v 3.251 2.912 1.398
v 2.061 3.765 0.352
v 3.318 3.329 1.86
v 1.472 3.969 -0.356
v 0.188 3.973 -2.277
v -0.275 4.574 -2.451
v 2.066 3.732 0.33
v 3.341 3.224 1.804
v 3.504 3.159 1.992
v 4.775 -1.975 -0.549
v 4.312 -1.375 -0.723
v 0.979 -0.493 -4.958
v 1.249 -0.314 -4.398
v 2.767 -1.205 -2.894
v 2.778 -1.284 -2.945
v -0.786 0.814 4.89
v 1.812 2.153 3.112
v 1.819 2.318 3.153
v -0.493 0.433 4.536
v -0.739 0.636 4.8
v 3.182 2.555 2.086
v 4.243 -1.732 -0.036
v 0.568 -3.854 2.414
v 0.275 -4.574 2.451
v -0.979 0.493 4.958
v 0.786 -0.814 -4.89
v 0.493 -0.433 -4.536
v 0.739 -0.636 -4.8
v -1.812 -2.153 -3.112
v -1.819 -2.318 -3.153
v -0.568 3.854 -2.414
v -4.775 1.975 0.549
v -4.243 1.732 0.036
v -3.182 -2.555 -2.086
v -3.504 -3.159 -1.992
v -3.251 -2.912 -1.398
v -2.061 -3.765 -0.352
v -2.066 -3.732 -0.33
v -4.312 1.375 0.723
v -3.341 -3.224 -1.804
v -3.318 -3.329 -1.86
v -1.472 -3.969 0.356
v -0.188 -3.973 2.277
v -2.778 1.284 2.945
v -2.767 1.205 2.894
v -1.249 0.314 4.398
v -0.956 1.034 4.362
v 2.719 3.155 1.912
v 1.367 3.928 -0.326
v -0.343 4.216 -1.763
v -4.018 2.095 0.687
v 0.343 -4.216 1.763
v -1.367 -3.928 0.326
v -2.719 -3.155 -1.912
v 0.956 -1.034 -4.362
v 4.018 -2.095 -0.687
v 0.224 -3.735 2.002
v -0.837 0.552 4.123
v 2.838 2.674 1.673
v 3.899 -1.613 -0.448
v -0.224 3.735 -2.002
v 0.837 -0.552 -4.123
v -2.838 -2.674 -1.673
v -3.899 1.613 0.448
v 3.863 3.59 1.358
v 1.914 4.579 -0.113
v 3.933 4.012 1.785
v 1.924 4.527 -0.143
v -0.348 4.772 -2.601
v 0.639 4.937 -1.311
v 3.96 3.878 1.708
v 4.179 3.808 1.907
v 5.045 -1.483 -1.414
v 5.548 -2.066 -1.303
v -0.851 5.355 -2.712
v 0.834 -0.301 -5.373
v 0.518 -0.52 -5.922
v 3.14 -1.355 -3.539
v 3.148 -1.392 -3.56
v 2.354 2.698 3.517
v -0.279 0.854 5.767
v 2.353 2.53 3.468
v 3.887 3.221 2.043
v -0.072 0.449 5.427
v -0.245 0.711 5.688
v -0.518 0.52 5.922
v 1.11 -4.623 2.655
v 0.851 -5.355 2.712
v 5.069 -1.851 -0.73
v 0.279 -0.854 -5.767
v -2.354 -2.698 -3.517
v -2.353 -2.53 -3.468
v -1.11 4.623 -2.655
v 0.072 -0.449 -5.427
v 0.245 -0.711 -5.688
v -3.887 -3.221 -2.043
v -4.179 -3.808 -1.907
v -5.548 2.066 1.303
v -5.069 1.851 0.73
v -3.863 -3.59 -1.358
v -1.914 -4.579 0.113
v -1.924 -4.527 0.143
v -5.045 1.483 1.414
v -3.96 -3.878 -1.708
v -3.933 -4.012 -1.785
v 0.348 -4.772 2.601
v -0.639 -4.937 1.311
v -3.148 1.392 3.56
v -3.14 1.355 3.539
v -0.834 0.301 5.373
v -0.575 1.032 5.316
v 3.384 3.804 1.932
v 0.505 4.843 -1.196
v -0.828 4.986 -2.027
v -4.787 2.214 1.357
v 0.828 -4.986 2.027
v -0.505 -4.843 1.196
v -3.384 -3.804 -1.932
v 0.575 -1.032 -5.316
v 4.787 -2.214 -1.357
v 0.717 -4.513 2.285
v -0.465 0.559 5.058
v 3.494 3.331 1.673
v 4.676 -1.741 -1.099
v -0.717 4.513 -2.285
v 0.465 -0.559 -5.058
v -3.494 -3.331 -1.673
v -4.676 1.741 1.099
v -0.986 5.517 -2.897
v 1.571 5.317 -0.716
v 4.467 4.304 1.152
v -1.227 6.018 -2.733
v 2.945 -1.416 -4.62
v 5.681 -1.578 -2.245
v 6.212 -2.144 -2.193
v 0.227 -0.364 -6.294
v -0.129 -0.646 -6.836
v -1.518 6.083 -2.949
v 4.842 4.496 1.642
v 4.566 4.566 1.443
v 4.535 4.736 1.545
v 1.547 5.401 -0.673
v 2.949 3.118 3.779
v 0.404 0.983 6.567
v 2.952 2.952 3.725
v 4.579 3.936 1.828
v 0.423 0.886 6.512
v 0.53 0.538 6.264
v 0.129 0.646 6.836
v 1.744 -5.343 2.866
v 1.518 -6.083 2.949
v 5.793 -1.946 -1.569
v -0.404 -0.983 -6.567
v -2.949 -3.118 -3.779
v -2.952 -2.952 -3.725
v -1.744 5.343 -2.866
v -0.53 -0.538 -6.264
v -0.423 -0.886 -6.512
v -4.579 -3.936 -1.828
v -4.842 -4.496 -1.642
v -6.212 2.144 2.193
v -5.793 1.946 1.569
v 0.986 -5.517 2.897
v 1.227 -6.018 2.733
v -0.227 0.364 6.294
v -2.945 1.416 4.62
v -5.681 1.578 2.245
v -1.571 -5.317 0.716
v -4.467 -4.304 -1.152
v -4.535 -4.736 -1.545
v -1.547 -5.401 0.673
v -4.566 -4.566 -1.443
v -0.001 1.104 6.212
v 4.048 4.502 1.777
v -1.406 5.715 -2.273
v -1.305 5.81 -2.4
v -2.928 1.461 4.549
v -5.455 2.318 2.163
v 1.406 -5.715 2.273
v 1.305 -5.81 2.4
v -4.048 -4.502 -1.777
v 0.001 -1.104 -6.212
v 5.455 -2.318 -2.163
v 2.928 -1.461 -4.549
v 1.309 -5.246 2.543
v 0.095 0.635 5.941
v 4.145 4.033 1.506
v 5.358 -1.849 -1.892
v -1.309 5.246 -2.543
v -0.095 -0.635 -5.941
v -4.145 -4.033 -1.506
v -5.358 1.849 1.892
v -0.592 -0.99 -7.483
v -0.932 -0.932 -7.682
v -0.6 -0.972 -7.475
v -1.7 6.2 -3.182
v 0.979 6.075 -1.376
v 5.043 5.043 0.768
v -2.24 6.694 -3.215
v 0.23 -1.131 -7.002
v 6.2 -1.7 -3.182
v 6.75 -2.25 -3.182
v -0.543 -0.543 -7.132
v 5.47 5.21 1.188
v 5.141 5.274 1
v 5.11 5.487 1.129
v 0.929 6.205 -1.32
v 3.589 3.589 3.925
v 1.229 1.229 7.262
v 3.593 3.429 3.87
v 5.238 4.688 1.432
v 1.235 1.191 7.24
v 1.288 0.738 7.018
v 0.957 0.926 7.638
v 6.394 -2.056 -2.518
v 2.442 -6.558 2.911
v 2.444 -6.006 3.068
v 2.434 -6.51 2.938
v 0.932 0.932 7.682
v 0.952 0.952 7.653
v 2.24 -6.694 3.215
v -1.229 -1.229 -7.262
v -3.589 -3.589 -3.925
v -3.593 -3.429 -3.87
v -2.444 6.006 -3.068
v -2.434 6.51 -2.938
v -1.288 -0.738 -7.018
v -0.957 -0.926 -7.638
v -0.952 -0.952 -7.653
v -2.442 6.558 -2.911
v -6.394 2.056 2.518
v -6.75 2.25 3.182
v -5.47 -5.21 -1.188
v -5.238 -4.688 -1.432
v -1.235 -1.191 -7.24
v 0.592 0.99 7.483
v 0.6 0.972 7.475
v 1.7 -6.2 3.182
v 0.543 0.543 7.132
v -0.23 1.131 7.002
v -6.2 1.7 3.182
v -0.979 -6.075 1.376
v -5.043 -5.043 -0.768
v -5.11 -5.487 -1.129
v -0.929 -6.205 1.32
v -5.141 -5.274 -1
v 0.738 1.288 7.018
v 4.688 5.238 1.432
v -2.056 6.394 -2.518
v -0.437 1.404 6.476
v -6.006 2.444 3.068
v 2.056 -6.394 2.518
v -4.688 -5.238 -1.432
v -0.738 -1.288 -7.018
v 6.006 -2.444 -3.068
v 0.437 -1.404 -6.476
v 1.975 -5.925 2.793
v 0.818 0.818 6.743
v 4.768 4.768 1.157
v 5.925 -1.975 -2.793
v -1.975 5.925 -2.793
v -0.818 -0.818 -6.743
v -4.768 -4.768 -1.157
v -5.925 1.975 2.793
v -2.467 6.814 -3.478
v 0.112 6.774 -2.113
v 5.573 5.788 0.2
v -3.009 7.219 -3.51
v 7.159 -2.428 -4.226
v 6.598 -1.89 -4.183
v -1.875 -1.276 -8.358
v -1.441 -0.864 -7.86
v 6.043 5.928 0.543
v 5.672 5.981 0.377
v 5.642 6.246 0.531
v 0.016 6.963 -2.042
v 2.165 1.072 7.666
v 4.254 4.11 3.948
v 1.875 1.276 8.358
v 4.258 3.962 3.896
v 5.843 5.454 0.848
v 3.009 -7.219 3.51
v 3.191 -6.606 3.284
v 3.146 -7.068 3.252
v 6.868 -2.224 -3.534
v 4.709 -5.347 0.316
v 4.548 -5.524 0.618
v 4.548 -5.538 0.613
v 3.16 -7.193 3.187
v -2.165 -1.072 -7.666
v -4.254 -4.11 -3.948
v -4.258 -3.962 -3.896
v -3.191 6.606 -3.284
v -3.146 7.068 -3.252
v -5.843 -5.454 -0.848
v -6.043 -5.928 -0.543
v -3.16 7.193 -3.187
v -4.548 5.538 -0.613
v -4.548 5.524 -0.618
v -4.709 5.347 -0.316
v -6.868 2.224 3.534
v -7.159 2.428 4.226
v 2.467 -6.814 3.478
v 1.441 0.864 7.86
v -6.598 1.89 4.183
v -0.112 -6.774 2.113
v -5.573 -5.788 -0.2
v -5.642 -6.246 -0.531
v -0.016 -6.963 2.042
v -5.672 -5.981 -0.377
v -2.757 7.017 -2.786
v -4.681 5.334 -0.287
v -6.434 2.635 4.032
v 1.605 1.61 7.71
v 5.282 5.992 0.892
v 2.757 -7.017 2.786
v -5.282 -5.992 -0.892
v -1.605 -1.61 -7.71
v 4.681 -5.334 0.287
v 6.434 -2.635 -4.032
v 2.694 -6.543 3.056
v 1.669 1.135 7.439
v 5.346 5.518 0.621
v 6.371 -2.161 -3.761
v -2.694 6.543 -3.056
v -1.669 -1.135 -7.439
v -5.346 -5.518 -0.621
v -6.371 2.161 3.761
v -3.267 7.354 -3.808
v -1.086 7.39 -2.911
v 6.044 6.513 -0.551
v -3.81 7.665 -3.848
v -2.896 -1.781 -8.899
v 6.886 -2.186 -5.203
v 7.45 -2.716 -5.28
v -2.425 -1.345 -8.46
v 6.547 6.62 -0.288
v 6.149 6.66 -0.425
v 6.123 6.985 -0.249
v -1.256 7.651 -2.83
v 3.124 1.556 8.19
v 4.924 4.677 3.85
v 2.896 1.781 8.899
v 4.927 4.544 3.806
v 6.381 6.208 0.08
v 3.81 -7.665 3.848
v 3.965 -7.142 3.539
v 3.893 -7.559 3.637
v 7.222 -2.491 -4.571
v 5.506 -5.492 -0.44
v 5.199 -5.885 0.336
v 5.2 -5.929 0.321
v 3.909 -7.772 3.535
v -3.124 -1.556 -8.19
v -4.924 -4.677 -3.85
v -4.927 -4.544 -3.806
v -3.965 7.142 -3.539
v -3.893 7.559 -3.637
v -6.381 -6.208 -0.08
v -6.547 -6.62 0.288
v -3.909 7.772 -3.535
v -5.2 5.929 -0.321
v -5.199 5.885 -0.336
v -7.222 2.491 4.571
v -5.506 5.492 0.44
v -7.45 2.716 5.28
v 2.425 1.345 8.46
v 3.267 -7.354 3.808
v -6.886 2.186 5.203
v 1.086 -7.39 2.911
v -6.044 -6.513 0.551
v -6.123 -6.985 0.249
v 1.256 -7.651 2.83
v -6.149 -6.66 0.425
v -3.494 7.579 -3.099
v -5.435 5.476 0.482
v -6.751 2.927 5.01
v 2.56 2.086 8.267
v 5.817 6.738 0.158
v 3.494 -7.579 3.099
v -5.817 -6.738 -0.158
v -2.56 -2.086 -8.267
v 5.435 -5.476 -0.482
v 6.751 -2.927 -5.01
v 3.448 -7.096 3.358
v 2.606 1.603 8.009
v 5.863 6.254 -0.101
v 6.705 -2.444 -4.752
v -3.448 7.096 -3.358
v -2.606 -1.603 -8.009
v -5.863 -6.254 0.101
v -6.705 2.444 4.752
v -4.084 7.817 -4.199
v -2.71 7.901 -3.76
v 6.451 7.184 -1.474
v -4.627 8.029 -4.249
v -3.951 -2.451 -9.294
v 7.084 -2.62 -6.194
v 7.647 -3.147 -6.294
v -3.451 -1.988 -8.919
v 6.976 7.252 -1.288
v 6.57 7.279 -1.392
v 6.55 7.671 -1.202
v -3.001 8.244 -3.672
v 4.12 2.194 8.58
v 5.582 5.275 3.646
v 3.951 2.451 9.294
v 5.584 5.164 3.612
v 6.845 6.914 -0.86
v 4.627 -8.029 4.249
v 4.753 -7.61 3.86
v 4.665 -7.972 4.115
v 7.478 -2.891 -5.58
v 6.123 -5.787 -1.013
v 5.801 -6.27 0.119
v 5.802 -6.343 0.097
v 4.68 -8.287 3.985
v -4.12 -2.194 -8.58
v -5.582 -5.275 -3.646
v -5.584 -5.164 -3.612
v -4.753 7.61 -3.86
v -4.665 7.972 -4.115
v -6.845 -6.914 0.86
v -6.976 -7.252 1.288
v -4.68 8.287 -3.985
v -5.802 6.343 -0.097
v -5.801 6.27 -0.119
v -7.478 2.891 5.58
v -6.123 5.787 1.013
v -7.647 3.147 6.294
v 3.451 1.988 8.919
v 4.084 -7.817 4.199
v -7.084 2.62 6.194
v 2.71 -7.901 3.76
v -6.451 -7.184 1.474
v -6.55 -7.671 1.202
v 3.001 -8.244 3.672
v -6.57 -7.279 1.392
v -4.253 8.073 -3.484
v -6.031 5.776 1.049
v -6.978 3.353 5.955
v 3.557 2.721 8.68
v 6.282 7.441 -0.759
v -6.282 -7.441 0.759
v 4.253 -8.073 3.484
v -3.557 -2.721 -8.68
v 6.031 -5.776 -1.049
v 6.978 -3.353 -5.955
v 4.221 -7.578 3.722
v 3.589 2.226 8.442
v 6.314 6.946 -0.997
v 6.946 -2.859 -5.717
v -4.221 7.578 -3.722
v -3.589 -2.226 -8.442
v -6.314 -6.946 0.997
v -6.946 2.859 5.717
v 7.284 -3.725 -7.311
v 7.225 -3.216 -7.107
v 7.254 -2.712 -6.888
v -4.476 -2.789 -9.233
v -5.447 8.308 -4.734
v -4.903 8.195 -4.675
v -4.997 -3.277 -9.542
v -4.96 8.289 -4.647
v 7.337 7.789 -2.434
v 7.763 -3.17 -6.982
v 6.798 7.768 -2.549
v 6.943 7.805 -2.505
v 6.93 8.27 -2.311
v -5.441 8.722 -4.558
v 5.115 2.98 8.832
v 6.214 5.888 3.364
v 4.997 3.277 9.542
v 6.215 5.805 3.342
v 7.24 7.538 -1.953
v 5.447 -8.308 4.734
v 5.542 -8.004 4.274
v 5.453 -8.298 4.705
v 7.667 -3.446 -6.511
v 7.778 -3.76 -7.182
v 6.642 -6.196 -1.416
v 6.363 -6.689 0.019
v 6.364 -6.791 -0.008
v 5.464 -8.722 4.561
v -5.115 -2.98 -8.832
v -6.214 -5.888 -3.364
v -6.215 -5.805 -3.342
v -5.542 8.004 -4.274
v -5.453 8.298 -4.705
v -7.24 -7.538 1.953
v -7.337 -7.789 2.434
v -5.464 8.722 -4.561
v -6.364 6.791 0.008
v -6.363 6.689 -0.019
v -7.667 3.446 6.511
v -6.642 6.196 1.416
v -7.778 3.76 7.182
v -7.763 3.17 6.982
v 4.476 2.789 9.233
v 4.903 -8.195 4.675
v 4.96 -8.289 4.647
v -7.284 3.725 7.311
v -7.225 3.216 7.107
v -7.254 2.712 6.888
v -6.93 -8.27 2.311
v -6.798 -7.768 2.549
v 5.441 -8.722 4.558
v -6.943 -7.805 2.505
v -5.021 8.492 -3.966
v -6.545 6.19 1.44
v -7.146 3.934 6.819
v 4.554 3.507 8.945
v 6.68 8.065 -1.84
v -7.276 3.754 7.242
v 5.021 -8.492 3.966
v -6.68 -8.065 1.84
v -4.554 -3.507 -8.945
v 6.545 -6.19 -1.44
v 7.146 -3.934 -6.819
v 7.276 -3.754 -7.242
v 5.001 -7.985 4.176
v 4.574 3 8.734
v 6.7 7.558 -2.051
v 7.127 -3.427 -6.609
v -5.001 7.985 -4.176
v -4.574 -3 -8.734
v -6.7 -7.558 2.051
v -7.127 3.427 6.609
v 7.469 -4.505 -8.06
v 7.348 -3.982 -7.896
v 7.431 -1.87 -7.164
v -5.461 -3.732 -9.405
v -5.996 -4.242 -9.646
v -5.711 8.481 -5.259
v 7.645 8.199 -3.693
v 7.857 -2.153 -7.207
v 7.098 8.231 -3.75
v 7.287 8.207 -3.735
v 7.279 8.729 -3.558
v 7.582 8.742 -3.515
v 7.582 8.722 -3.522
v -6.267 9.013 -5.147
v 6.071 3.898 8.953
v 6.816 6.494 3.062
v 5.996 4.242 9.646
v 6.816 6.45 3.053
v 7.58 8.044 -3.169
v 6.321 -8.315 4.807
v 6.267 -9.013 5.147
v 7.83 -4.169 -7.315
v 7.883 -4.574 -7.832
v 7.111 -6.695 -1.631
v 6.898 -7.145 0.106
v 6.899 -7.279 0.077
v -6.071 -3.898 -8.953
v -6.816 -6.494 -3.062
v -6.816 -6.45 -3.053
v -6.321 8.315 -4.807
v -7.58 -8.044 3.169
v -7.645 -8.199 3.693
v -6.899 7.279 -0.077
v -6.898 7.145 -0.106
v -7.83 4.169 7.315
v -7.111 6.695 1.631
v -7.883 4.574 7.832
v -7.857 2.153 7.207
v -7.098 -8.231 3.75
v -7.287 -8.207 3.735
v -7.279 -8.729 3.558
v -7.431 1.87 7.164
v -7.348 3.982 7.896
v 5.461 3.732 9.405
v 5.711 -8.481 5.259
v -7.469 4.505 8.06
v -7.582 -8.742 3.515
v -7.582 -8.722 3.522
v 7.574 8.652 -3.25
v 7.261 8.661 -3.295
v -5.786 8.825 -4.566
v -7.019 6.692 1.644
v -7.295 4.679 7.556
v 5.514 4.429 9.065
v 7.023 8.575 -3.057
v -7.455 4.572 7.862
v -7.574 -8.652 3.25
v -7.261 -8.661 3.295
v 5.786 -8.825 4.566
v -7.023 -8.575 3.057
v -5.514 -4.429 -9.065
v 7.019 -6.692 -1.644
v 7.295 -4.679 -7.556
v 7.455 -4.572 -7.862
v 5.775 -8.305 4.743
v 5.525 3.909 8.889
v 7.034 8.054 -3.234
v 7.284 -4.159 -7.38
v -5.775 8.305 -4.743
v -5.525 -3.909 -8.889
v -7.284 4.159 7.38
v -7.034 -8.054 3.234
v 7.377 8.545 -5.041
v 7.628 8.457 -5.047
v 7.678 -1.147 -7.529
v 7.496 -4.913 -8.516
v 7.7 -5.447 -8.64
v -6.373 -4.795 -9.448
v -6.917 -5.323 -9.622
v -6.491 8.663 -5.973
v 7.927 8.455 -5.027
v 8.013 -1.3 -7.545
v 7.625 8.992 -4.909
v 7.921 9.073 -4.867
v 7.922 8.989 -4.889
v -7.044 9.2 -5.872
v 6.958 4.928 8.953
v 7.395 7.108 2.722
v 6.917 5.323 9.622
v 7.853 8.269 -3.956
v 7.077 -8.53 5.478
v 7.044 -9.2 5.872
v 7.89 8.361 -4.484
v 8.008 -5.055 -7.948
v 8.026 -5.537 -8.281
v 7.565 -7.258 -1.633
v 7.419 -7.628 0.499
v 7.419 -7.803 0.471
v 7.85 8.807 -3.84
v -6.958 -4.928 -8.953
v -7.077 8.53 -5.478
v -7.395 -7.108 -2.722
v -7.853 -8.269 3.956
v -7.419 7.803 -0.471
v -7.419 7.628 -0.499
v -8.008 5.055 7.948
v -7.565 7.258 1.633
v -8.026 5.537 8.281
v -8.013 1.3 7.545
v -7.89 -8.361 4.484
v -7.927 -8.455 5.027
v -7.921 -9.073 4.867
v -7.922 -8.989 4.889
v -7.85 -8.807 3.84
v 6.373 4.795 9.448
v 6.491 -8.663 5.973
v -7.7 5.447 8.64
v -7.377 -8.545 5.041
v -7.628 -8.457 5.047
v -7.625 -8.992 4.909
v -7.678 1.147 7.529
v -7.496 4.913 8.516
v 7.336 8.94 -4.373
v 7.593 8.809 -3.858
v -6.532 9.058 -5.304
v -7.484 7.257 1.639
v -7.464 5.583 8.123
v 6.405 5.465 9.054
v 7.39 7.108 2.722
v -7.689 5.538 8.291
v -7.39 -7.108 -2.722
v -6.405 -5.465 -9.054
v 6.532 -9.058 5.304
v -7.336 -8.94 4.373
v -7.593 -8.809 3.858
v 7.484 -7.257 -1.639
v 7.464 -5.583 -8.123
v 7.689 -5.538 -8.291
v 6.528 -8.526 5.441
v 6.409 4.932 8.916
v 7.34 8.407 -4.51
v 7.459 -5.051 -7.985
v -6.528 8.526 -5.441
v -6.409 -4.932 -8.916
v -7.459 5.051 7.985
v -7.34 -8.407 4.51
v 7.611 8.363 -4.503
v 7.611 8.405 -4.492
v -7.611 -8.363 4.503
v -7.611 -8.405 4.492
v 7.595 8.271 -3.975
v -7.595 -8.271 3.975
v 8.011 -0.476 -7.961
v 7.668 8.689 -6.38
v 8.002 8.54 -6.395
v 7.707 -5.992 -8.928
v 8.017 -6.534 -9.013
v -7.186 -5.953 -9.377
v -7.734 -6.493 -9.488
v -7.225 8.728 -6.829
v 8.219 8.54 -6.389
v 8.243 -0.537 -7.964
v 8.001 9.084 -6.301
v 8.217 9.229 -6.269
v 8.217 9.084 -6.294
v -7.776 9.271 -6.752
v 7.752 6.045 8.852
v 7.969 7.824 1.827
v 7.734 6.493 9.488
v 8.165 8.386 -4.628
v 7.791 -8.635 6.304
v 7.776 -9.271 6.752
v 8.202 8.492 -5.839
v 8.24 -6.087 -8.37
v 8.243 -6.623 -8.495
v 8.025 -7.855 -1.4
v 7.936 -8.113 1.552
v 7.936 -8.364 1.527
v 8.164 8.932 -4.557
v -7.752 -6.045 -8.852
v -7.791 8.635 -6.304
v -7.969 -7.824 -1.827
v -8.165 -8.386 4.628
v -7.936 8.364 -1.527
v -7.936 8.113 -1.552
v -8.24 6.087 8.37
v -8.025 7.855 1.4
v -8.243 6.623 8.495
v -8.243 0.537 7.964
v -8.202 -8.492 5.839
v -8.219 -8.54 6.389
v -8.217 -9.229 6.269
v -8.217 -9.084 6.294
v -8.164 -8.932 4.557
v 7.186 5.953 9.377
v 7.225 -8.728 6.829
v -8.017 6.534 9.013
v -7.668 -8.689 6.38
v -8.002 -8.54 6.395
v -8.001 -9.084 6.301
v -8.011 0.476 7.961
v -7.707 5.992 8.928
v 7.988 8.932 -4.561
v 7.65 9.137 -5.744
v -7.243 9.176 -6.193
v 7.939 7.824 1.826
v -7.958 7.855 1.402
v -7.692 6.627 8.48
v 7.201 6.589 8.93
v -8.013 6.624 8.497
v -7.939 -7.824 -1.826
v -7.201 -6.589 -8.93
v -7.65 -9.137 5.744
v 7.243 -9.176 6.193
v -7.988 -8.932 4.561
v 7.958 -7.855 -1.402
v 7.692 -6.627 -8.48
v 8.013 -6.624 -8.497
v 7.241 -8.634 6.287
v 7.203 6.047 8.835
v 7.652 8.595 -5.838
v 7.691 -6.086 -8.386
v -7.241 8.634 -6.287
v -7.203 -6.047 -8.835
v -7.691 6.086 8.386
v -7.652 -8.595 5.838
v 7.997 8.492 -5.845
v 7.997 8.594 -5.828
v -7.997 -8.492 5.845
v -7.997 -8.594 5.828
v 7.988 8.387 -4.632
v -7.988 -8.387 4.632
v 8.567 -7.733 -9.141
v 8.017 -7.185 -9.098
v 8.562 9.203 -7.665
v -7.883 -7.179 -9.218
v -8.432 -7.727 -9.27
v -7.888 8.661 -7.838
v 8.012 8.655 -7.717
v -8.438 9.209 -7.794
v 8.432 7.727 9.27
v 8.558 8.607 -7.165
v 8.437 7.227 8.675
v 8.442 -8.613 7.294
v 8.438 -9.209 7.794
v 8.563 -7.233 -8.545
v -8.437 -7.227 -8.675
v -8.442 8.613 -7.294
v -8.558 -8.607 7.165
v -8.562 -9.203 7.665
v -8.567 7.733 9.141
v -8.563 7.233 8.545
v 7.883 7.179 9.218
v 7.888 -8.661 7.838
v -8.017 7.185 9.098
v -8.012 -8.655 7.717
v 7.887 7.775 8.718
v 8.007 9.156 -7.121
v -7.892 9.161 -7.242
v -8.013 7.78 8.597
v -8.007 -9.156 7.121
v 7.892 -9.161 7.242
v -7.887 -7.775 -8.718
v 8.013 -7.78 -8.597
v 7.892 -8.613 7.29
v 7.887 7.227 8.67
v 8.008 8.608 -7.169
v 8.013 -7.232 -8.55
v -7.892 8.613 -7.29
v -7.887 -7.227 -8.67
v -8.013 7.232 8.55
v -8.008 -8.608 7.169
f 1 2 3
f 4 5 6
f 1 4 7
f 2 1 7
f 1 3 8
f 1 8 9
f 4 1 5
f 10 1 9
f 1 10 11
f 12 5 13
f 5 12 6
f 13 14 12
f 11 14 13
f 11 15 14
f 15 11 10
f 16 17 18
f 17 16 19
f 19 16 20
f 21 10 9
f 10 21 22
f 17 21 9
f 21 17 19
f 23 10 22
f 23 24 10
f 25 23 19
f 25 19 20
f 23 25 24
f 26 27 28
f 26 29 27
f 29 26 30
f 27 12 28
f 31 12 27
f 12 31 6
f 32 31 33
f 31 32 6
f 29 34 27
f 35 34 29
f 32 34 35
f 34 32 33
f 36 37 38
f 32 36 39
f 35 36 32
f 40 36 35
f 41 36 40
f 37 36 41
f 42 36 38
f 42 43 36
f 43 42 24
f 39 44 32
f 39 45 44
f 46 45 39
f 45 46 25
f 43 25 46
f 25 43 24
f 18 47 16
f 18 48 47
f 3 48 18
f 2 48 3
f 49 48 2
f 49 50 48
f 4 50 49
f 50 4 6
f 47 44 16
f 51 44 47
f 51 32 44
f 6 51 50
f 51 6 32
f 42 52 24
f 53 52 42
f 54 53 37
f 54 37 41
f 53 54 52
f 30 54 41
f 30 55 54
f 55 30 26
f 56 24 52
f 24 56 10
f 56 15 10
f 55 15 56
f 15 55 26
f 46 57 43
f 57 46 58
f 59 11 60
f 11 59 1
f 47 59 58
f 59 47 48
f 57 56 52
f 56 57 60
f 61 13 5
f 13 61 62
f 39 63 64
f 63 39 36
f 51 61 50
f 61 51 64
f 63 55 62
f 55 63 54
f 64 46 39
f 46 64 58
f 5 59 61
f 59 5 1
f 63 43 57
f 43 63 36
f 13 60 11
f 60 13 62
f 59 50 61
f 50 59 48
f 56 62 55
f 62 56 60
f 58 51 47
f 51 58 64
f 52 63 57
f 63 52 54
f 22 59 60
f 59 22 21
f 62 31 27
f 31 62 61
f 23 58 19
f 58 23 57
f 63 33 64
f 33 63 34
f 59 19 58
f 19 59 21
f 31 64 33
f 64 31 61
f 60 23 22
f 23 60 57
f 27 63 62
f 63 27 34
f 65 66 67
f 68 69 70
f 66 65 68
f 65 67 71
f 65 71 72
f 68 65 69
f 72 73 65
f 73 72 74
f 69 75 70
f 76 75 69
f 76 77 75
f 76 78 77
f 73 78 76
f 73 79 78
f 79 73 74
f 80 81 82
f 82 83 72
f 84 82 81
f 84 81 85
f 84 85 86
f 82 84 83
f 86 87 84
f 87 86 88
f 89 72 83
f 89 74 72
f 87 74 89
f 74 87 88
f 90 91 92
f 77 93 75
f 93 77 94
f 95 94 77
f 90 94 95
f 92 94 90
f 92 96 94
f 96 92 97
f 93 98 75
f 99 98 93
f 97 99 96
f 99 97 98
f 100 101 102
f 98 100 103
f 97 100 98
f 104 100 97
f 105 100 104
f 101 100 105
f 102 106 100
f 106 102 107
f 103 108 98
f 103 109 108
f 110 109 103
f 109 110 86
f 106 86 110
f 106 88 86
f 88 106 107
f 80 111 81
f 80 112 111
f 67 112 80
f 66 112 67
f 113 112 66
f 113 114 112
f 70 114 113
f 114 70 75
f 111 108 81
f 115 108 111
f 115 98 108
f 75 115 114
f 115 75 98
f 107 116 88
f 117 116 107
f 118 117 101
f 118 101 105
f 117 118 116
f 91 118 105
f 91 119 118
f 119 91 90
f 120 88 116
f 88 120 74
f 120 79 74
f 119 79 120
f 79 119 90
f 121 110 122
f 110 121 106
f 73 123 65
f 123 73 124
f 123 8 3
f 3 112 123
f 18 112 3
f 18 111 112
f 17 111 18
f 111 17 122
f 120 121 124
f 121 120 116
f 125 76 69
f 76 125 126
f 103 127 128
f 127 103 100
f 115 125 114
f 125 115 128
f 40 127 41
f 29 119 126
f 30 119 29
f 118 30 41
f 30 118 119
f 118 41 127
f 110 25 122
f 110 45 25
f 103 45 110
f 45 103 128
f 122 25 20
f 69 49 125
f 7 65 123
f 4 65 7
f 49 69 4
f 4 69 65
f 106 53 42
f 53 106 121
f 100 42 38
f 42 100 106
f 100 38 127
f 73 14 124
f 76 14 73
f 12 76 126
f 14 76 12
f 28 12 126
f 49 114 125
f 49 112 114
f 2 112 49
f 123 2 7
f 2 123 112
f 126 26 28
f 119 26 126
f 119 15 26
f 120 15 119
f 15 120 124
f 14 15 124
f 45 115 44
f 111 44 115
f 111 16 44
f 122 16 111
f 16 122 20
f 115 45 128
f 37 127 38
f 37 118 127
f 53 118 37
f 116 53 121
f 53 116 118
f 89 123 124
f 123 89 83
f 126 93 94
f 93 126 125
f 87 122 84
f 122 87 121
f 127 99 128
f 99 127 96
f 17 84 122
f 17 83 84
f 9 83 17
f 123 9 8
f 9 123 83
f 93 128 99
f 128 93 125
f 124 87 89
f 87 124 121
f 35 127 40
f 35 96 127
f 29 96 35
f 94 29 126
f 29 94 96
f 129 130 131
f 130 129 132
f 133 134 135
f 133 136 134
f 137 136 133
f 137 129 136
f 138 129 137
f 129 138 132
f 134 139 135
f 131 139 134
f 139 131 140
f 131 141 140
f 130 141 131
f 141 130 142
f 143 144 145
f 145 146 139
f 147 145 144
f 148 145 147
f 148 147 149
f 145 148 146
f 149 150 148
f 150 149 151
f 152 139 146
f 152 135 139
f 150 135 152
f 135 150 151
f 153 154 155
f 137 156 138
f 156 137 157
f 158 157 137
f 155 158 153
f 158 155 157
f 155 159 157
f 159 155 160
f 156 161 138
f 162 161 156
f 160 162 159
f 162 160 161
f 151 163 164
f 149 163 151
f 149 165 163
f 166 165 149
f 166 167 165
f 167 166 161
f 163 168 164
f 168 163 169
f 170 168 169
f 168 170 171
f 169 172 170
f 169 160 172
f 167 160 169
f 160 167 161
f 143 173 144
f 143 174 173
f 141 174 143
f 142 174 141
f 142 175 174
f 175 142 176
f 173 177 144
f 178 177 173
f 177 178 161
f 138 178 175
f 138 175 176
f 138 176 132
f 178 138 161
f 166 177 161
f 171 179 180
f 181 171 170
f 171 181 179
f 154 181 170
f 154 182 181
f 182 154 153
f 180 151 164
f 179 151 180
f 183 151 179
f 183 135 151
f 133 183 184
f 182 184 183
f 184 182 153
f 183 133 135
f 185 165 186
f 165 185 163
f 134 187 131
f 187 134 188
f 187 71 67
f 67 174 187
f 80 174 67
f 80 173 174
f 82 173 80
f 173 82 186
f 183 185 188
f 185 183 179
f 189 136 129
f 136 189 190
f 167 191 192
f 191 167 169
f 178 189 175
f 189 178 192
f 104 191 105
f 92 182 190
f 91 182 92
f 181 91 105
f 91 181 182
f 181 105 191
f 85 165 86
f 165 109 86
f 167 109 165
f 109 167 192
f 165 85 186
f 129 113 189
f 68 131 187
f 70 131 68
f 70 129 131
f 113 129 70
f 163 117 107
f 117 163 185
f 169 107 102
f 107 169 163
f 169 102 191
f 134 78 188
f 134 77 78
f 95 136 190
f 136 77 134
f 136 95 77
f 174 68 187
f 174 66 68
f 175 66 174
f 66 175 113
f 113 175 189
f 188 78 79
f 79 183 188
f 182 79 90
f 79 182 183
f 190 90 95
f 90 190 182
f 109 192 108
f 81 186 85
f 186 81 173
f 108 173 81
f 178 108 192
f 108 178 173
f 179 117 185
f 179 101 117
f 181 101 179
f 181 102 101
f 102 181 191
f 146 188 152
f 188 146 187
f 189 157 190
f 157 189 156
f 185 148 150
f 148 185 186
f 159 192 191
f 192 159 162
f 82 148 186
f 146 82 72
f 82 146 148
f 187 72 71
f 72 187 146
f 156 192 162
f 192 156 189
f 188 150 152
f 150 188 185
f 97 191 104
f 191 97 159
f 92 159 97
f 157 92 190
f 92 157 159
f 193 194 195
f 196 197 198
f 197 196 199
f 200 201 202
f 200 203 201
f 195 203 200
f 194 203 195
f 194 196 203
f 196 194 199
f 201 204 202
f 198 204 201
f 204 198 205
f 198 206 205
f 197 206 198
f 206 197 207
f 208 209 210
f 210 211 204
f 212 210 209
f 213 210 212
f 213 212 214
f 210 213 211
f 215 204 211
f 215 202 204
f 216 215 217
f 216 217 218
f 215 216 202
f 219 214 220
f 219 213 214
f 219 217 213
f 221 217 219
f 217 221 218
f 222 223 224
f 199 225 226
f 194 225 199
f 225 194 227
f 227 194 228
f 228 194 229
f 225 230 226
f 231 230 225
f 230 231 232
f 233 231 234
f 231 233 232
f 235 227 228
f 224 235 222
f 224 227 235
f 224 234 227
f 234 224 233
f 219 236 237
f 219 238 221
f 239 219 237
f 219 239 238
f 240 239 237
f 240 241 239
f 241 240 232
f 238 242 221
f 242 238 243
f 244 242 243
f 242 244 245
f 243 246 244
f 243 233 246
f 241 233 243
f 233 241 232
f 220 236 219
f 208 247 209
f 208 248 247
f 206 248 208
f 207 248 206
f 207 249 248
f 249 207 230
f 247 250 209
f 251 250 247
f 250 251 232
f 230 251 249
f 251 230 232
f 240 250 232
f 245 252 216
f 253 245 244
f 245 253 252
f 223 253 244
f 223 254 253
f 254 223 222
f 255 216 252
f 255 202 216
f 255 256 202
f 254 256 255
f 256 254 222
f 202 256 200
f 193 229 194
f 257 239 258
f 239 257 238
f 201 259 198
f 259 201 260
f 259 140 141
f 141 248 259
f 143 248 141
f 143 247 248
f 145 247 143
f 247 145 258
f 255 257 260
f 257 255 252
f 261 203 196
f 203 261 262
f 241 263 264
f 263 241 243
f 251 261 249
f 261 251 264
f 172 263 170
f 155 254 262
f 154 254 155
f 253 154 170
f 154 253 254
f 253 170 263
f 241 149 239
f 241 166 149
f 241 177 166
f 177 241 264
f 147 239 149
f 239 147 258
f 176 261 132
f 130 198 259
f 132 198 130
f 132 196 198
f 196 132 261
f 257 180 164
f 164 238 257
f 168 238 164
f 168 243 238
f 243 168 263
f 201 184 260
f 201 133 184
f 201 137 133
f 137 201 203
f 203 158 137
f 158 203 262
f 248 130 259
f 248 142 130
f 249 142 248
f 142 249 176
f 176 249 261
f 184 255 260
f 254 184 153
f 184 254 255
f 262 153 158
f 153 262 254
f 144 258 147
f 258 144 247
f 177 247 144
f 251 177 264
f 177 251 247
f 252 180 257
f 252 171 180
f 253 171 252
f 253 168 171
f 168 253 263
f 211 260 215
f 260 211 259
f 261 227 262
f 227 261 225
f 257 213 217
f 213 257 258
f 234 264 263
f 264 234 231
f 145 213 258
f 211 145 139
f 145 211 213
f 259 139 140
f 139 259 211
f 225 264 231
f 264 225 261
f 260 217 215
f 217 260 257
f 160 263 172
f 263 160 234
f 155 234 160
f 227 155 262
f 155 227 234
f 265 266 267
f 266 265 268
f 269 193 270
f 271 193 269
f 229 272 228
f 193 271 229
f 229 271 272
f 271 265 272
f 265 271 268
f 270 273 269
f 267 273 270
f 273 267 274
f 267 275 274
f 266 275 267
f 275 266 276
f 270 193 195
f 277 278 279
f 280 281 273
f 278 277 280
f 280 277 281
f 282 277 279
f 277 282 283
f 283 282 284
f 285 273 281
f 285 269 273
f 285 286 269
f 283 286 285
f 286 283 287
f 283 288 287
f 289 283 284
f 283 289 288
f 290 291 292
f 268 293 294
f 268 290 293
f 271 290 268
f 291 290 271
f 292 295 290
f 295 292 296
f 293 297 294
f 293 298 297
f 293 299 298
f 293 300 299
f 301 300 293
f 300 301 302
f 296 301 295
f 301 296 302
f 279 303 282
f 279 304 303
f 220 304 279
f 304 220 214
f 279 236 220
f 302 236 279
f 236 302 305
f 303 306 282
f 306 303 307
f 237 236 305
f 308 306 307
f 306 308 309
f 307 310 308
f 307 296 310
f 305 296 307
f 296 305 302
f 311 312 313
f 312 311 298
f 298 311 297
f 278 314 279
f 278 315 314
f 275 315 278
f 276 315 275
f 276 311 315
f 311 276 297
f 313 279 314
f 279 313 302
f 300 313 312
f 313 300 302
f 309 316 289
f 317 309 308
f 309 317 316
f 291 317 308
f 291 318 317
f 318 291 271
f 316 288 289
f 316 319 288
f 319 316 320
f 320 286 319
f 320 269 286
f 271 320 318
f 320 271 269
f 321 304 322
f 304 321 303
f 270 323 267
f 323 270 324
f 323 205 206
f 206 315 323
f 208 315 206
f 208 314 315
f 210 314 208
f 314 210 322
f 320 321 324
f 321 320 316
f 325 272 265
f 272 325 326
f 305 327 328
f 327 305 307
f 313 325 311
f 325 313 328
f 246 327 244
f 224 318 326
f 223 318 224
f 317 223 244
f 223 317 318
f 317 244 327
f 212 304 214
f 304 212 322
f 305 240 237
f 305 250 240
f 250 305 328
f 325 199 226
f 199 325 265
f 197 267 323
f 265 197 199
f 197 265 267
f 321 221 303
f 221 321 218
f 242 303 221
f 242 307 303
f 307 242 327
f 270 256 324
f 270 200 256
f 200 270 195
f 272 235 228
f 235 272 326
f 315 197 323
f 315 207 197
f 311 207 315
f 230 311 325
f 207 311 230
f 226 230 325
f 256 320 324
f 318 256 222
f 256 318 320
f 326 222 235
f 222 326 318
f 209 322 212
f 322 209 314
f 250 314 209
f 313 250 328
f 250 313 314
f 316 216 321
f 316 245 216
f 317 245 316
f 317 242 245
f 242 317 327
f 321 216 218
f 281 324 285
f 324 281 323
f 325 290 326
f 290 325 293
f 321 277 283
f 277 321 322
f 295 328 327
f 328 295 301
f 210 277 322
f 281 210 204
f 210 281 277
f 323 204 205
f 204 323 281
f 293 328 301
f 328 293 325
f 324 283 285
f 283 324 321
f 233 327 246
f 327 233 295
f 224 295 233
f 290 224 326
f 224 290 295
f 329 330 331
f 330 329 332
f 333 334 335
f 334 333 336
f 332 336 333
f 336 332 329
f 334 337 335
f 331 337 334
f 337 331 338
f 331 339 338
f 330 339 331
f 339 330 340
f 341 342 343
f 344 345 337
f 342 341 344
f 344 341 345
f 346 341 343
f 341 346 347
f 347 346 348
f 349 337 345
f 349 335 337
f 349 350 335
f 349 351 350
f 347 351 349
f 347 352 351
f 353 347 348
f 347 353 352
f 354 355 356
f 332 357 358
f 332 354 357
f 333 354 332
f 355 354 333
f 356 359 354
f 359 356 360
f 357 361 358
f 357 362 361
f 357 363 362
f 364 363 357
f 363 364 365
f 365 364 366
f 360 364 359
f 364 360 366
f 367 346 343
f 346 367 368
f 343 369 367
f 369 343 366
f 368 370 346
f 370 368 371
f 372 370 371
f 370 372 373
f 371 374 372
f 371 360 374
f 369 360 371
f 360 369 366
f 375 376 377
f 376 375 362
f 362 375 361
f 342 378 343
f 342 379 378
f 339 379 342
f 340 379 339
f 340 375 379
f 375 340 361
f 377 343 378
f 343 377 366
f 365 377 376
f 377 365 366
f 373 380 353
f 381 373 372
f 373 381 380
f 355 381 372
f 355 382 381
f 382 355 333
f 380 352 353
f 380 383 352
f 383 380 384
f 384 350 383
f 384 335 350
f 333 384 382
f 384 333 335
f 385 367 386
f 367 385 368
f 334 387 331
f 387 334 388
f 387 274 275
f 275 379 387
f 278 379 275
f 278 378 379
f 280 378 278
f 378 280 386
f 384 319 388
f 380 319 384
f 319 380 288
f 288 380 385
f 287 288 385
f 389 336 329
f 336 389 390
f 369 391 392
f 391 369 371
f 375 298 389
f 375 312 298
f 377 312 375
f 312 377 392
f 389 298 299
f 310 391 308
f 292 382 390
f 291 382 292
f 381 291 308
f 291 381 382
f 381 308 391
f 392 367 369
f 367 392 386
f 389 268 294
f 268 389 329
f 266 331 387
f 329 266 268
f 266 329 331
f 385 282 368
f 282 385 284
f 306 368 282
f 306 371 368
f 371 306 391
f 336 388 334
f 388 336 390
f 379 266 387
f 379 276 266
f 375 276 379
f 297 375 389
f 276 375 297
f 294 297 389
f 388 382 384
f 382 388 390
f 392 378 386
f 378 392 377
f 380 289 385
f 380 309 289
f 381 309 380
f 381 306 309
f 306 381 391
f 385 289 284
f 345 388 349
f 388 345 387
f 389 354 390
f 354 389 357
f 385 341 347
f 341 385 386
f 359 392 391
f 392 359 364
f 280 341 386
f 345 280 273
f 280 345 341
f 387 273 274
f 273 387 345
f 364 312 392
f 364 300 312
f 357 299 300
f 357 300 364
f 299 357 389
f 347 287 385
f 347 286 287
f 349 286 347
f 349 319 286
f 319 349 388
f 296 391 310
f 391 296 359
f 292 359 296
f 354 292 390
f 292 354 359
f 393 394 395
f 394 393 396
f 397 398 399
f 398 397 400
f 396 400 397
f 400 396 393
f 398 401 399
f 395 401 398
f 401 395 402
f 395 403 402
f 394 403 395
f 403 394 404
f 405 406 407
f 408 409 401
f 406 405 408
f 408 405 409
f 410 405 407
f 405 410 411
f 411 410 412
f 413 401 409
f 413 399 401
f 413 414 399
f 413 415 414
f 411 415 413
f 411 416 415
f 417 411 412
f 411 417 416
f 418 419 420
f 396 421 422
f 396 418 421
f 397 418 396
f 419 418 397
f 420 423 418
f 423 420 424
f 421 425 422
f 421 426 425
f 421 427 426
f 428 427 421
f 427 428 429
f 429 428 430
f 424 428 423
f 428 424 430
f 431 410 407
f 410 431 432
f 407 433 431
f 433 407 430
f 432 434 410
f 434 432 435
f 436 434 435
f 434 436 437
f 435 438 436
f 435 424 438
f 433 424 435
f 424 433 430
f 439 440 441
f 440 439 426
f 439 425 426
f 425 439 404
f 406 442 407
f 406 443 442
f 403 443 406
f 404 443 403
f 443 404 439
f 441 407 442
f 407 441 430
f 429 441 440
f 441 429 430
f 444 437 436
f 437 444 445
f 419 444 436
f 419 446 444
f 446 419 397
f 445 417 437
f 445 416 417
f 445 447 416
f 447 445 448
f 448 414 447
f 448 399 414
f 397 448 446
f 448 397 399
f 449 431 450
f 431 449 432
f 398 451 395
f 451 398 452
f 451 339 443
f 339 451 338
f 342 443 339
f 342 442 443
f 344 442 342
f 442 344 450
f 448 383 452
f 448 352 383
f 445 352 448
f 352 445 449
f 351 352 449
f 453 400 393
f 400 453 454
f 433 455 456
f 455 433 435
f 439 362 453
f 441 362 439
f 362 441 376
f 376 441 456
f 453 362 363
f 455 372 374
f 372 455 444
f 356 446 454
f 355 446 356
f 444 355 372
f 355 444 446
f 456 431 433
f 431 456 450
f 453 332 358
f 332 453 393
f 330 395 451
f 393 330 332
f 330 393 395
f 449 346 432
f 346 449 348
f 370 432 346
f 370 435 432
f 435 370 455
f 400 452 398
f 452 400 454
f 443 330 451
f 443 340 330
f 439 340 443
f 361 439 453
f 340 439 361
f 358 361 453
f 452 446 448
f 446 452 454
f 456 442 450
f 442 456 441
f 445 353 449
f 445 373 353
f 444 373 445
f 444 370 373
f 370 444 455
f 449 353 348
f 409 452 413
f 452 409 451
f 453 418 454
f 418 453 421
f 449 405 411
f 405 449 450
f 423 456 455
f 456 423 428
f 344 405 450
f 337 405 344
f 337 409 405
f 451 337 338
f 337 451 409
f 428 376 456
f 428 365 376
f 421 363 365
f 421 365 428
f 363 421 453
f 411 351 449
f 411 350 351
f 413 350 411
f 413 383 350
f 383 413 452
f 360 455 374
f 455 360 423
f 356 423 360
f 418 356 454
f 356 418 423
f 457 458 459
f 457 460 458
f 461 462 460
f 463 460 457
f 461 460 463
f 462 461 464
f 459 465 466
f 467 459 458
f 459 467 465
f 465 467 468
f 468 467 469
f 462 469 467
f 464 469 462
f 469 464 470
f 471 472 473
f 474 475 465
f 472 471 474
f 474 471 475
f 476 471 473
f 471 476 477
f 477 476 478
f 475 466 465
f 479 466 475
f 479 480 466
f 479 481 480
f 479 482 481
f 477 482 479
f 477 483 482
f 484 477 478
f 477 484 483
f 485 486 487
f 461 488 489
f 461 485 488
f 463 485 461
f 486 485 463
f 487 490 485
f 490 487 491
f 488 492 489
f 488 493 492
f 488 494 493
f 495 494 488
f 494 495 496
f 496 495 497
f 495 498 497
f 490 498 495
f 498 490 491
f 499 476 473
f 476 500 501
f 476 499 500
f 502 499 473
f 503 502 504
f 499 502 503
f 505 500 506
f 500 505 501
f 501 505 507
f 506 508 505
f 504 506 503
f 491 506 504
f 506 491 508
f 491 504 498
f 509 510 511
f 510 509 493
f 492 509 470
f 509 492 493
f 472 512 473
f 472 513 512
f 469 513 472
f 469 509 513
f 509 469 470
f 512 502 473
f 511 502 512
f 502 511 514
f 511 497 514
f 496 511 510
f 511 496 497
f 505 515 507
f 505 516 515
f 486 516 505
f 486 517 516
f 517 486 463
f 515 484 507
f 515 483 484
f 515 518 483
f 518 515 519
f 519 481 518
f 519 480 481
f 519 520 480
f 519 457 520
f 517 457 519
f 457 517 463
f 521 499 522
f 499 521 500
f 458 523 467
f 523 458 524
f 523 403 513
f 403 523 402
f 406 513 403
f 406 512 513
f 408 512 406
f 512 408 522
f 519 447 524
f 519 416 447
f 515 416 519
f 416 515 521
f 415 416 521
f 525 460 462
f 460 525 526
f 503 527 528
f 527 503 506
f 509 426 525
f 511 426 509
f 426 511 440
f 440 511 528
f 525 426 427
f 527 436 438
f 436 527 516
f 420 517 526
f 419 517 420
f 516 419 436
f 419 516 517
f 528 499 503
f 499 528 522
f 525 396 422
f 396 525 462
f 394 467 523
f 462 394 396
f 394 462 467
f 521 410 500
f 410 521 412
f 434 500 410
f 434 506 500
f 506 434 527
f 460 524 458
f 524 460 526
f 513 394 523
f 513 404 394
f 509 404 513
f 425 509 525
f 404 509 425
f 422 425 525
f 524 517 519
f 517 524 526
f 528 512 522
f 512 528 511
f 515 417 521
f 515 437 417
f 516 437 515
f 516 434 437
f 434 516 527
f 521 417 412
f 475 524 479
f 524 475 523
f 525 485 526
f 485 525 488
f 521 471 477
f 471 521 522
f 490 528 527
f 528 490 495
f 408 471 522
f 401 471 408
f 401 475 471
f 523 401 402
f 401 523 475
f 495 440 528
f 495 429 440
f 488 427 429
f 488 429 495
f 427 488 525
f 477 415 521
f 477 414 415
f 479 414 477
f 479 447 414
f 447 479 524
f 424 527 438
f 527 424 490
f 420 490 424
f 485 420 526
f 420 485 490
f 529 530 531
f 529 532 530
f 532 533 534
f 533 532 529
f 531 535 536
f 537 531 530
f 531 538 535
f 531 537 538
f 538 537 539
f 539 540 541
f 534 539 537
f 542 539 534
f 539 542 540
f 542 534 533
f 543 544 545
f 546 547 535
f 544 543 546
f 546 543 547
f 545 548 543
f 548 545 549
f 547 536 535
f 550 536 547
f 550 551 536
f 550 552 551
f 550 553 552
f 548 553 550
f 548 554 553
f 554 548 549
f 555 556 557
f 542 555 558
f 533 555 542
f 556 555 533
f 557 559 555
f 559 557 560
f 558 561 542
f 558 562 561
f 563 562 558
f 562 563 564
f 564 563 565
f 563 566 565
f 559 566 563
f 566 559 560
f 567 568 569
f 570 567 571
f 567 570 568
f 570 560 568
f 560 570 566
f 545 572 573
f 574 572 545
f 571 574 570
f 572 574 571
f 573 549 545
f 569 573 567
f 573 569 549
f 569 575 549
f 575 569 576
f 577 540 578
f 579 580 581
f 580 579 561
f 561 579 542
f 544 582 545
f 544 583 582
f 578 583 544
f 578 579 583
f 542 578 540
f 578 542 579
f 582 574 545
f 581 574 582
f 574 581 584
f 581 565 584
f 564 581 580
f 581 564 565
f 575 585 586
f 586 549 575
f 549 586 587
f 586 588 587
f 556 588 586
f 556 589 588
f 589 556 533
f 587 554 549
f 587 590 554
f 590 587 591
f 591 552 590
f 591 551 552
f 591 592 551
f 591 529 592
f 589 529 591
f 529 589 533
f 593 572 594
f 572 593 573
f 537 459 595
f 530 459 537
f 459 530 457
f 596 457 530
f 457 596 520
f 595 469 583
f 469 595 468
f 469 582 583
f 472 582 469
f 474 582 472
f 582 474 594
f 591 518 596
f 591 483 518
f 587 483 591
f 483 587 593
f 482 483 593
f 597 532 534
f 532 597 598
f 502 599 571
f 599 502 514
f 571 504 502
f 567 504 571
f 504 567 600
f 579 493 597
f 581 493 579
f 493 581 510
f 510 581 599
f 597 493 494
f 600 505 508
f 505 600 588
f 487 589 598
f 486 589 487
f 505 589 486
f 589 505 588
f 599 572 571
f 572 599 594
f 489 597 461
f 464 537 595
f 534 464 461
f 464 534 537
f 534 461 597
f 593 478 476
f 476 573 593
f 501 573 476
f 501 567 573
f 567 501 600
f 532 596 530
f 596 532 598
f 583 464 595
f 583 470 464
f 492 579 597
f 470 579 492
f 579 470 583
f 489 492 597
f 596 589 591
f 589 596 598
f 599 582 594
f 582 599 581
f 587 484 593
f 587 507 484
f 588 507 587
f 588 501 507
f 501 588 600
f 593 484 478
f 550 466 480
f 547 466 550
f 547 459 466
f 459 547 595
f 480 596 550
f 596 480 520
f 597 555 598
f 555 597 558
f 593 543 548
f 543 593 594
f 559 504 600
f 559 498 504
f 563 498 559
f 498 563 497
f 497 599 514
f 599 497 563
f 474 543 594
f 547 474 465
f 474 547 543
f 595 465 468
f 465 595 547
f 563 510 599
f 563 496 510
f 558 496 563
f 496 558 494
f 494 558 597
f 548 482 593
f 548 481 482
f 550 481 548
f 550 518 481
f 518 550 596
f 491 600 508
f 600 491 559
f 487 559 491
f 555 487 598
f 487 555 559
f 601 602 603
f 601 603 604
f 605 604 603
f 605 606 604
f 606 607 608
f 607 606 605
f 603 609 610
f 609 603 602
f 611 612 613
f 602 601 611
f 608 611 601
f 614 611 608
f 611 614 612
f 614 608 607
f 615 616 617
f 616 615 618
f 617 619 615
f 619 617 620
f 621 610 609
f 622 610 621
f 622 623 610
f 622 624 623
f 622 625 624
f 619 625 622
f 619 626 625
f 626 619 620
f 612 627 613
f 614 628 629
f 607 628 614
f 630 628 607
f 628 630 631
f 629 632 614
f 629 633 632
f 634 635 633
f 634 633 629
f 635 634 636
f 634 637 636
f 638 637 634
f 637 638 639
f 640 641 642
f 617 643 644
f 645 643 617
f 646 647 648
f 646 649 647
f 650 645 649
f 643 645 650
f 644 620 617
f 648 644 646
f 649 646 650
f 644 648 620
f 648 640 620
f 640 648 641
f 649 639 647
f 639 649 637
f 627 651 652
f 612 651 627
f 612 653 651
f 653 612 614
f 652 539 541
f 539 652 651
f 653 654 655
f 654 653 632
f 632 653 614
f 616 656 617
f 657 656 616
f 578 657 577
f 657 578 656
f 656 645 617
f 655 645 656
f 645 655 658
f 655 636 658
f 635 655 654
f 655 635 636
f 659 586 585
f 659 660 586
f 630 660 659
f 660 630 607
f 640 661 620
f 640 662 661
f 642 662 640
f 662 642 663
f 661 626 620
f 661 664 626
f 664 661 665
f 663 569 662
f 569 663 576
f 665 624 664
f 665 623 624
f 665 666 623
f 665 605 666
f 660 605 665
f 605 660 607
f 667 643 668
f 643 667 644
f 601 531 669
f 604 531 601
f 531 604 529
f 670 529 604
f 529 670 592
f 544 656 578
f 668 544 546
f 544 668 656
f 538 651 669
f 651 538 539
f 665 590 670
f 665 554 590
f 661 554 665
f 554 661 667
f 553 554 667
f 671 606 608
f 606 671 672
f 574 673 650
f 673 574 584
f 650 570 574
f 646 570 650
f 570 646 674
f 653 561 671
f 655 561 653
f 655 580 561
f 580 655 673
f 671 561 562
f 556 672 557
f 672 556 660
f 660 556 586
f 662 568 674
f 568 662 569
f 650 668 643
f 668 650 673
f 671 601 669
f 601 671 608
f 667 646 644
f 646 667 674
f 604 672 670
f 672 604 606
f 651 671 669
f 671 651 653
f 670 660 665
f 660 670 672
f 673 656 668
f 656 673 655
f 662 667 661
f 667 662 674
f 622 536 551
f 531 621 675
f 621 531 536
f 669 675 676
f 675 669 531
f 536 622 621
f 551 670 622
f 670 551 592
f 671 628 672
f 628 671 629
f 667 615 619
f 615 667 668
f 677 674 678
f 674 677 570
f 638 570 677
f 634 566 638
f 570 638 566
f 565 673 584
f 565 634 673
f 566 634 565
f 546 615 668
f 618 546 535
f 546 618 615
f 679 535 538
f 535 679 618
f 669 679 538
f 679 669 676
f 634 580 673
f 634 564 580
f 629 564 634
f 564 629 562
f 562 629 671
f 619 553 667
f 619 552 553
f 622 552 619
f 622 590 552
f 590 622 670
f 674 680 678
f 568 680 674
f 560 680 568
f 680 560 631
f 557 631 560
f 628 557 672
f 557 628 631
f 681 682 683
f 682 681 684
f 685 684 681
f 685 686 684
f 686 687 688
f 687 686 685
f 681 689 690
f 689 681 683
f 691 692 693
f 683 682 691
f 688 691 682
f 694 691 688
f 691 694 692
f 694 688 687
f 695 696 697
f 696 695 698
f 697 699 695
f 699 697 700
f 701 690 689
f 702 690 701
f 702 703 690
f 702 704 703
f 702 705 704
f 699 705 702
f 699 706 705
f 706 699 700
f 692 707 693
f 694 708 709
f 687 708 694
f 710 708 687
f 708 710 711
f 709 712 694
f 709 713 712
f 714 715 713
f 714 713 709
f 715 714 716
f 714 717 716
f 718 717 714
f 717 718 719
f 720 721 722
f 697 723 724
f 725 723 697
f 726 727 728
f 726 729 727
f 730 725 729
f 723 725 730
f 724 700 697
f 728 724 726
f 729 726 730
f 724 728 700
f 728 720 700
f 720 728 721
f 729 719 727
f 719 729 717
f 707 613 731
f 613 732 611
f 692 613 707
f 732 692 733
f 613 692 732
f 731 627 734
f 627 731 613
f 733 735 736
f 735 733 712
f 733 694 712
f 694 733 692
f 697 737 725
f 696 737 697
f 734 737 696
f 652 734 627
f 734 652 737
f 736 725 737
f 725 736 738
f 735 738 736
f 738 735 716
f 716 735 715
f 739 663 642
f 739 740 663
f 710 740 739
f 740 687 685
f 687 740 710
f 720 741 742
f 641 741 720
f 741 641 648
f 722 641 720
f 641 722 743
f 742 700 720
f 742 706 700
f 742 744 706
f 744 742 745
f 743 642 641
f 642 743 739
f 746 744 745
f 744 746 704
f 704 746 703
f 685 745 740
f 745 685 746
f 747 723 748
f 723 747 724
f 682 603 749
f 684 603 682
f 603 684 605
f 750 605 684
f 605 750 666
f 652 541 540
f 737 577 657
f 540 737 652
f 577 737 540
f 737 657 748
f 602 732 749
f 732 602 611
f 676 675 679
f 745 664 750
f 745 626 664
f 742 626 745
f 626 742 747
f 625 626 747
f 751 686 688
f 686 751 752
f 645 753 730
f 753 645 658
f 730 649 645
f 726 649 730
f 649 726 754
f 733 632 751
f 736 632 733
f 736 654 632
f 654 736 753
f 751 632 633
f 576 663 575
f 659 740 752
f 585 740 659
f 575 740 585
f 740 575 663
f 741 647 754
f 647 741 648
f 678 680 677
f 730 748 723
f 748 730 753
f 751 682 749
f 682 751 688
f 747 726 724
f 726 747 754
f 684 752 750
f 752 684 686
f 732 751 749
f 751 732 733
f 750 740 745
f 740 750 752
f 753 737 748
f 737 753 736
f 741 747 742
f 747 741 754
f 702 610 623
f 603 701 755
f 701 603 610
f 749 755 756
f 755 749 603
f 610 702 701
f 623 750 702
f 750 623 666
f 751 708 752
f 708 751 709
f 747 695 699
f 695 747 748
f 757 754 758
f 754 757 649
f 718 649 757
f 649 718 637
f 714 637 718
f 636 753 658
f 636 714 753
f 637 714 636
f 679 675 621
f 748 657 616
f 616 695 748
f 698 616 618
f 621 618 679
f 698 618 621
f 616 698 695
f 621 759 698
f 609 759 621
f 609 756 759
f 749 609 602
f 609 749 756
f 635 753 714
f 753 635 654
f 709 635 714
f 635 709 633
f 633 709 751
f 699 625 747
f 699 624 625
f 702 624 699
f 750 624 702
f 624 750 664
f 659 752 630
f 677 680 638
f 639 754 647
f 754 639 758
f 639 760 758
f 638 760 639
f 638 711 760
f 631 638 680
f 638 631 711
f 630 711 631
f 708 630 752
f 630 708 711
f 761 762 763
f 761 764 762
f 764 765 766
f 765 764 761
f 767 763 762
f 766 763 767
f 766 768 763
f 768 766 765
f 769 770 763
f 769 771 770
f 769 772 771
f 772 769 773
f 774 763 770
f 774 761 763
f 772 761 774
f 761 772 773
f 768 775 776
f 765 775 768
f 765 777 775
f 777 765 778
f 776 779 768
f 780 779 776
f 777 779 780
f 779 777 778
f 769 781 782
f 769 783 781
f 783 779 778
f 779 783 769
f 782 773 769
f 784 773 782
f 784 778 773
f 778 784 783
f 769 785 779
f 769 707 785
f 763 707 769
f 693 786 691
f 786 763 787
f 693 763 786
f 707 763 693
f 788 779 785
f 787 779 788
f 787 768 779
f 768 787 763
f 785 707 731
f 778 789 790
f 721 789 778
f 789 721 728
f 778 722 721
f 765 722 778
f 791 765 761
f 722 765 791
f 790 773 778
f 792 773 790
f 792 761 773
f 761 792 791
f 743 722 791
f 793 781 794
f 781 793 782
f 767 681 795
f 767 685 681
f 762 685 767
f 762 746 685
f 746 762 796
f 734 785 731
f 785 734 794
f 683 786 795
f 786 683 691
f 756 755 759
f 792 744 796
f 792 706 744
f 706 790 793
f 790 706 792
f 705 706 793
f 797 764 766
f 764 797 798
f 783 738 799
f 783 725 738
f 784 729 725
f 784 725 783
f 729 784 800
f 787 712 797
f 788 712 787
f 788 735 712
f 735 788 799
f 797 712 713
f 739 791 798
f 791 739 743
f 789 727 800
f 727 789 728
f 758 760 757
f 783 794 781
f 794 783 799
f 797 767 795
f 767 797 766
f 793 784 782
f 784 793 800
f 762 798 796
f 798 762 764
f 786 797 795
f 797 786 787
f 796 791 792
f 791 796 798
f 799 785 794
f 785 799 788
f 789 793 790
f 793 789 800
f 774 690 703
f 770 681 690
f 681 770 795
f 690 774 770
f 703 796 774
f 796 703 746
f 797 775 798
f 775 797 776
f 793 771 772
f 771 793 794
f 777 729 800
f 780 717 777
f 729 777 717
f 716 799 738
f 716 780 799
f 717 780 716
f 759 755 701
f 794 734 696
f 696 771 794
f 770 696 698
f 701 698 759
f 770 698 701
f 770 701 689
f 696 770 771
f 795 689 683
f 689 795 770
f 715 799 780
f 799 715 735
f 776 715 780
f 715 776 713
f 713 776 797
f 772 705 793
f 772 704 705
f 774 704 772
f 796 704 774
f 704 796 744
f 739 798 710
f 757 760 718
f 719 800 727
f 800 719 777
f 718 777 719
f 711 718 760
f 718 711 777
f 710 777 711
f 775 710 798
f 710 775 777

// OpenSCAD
t = 10;
wth = 1.1;//width of bars
rtn = 90/17;
for(h = [6 : 17])
{ 
    rotate([h*5,h*5,h*5])
 difference(){
     
    cube(size = [h,h,h], center = true);
     
         cube(size = [h,h-wth,h-wth], center = true);
         cube(size = [h-wth,h,h-wth], center = true);
         cube(size = [h-wth,h-wth,h], center = true);
     t=t-1;
     
  } 
}
